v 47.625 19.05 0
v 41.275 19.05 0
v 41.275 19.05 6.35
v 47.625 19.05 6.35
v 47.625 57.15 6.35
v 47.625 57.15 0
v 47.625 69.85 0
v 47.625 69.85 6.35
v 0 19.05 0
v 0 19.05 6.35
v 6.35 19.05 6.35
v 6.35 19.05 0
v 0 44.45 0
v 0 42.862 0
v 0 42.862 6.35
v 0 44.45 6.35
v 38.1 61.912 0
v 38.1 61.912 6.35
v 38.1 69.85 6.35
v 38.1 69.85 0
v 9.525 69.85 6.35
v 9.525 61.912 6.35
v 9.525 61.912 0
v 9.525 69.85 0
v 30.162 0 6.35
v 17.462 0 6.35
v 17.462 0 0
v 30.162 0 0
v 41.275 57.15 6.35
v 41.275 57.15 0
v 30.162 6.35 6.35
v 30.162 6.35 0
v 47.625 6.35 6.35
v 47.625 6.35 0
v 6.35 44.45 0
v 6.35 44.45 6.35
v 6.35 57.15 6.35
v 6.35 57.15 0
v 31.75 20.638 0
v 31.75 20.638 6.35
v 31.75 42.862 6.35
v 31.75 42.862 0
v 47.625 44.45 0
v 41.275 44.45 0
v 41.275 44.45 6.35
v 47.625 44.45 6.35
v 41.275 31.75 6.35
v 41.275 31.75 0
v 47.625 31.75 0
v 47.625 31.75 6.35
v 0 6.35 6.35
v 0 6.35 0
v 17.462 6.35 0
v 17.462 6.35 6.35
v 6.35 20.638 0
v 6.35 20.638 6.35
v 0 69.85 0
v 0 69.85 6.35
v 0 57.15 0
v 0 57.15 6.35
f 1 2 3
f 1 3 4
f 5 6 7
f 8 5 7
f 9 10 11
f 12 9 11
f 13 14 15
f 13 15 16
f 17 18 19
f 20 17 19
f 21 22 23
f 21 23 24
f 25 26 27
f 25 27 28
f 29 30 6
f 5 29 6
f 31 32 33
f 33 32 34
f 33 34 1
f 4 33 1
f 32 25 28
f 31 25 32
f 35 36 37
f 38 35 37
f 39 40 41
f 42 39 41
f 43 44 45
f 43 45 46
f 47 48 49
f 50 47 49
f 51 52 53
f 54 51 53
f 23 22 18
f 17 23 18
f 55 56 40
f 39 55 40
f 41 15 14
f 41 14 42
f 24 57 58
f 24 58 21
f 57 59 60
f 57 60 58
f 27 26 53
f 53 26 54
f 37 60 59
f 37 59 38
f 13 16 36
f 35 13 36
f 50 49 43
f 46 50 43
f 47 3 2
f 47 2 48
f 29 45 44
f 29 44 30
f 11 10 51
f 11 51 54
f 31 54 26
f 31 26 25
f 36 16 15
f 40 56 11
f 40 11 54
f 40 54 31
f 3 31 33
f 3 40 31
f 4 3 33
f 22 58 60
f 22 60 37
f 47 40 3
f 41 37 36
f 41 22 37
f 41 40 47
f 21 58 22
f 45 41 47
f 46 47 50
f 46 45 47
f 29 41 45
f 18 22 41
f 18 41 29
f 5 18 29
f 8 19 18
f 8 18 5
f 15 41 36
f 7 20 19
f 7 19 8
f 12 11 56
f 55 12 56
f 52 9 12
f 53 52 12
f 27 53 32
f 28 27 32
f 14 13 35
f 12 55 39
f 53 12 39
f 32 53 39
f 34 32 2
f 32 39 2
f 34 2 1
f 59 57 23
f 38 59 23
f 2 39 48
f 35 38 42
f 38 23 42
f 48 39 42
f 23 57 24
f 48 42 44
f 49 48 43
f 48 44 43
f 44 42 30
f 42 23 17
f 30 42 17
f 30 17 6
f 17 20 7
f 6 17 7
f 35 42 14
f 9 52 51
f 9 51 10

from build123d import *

# Parameters (mm, degrees)
SKETCH1_W           = 47.625
SKETCH1_H           = 63.5
BOSS_EXTRUDE1_DEPTH = 6.35
SKETCH2_W           = 12.7
SKETCH2_H           = 12.7
BOSS_EXTRUDE2_DEPTH = 6.35
SKETCH3_W           = 6.35
SKETCH3_H           = 12.7
CUT_EXTRUDE1_DEPTH  = 85.77904001
LPATTERN1_COUNT     = 2
LPATTERN1_PITCH     = 25.4
SKETCH4_W           = 50.8
SKETCH4_H           = 22.225
SERVO_CUT_DEPTH     = 85.77904001
SKETCH5_W           = 28.575
SKETCH5_H           = 15.875
CUT_EXTRUDE2_DEPTH  = 85.77904001


with BuildPart() as part:
    # Sketch1 → Boss-Extrude1 (new body)
    with BuildSketch(Plane.XY):
        with Locations((23.8125, 38.1)):
            Rectangle(SKETCH1_W, SKETCH1_H)
    extrude(amount=BOSS_EXTRUDE1_DEPTH)

    # Sketch2 → Boss-Extrude2 (add)
    with BuildSketch(Plane.XY.offset(6.35)):
        with Locations((23.8125, 6.35)):
            Rectangle(SKETCH2_W, SKETCH2_H)
    extrude(amount=-BOSS_EXTRUDE2_DEPTH)

    # Sketch3 → Cut-Extrude1 (cut, through all)
    with BuildSketch(Plane.XY.offset(6.35)):
        with Locations((3.175, 25.4)):
            Rectangle(SKETCH3_W, SKETCH3_H)
        with Locations((44.45, 25.4)):
            Rectangle(SKETCH3_W, SKETCH3_H)
    cut_extrude1 = extrude(amount=-CUT_EXTRUDE1_DEPTH, mode=Mode.SUBTRACT)

    # LPattern1: Cut-Extrude1 ×2
    with Locations(*[(0, i * LPATTERN1_PITCH, 0) for i in range(1, LPATTERN1_COUNT)]):
        add(cut_extrude1, mode=Mode.SUBTRACT)

    # Sketch4 → Servo Cut (cut, through all)
    with BuildSketch(Plane.XY.offset(6.35)):
        with Locations((6.35, 31.75)):
            Rectangle(SKETCH4_W, SKETCH4_H)
    extrude(amount=-SERVO_CUT_DEPTH, mode=Mode.SUBTRACT)

    # Sketch5 → Cut-Extrude2 (cut, through all)
    with BuildSketch(Plane.XY.offset(6.35)):
        with Locations((23.8125, 69.85)):
            Rectangle(SKETCH5_W, SKETCH5_H)
    extrude(amount=-CUT_EXTRUDE2_DEPTH, mode=Mode.SUBTRACT)


solid = part.part
